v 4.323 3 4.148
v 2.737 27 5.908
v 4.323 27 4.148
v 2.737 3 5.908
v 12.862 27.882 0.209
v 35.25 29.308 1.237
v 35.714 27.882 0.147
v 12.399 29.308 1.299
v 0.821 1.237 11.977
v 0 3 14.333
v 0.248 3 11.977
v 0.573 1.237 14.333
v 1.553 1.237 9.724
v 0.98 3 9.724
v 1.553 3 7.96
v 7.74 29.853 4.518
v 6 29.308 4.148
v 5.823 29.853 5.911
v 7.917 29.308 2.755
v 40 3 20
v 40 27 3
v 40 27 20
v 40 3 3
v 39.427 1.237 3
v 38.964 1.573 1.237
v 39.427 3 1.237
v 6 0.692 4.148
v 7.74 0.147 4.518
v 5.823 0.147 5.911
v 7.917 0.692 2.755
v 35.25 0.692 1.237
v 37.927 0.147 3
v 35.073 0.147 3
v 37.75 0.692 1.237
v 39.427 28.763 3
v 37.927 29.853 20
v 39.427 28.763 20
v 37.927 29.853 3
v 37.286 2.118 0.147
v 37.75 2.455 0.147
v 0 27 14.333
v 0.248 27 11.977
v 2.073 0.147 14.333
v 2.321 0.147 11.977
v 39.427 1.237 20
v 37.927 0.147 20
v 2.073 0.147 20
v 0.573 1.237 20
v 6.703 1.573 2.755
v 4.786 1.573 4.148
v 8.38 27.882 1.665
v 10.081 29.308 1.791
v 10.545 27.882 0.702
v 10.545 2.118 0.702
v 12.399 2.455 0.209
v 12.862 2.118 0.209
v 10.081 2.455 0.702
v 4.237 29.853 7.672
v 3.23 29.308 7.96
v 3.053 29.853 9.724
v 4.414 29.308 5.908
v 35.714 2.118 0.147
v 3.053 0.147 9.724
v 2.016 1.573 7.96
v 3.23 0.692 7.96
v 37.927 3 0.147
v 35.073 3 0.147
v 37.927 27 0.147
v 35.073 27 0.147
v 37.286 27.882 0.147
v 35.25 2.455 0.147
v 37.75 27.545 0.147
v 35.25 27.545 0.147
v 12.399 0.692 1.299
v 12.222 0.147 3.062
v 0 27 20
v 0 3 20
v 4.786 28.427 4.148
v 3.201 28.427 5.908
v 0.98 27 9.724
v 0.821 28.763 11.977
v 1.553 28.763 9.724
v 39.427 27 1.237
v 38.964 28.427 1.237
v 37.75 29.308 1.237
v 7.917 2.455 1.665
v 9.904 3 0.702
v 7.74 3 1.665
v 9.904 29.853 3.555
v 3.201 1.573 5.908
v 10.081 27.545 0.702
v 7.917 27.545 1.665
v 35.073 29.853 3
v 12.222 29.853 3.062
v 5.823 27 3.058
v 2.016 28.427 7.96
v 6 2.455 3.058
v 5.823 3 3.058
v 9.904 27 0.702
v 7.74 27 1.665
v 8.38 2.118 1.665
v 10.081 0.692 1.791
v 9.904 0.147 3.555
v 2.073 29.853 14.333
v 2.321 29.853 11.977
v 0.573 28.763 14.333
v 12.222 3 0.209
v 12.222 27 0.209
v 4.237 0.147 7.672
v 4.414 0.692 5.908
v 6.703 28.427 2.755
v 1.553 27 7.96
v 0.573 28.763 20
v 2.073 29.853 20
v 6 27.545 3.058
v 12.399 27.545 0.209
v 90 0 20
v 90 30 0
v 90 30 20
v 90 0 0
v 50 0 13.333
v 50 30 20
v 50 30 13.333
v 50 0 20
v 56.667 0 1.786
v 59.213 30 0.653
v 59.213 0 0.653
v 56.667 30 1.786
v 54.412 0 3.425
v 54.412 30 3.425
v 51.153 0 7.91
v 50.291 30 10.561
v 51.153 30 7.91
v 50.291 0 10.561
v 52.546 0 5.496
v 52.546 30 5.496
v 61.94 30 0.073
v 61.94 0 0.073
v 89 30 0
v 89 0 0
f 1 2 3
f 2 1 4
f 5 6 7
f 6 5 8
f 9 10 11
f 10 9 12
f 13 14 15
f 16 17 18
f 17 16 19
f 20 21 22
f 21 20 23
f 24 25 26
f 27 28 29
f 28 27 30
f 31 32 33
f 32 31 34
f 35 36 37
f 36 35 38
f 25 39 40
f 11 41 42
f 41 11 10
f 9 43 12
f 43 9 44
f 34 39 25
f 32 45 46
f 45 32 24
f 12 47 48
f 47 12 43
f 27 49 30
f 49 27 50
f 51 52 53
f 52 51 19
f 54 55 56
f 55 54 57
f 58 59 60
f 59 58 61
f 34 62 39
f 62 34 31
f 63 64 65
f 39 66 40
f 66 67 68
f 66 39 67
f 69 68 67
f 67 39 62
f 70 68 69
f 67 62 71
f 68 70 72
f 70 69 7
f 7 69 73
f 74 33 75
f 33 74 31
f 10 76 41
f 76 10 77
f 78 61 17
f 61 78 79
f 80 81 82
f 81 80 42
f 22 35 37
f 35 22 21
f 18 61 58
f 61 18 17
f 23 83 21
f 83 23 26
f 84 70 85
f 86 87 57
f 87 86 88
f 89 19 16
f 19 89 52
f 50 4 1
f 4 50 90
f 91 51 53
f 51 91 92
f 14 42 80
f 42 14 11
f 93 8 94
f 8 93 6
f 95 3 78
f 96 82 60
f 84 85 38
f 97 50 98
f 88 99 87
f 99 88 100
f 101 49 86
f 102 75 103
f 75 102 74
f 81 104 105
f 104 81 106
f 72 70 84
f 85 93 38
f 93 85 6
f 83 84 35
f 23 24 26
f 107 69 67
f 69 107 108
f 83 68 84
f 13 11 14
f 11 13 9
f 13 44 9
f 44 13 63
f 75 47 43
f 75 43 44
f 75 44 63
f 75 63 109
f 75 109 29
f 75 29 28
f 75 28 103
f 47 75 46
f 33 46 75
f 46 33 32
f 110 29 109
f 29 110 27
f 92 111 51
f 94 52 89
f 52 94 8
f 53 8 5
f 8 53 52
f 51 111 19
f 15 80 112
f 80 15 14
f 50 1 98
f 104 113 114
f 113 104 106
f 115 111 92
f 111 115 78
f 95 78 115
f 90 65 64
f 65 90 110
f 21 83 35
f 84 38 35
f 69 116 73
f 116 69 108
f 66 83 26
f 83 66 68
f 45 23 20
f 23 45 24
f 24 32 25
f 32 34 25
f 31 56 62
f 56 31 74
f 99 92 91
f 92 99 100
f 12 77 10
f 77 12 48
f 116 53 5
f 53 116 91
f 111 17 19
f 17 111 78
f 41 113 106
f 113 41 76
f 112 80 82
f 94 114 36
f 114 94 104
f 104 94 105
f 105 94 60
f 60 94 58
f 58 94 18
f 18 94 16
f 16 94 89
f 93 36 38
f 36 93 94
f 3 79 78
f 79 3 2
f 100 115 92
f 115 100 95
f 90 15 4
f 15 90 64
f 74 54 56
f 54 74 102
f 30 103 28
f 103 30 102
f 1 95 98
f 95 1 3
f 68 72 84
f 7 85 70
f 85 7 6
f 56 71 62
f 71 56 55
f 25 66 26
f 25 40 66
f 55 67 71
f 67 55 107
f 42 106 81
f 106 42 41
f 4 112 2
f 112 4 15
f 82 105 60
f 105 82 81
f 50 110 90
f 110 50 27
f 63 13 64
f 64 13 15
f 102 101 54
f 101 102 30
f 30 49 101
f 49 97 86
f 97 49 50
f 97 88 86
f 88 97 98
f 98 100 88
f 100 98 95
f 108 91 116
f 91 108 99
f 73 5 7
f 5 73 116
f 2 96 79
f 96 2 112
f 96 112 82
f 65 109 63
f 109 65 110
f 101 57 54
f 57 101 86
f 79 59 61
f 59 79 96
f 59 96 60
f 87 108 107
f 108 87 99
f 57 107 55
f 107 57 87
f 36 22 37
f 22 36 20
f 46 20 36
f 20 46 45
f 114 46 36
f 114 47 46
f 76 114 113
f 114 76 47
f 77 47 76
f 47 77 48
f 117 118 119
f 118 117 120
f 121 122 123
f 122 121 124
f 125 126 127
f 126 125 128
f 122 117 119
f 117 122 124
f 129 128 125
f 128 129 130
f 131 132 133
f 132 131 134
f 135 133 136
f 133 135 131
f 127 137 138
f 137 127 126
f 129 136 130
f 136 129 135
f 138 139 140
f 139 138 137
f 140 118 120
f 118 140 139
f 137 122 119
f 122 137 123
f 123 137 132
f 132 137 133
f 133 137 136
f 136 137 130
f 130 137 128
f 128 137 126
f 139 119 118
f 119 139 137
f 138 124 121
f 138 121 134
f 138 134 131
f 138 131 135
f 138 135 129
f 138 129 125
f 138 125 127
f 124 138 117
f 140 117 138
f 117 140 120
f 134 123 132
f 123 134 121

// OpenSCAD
// file: ../rounded_square.scad
$bleed = 1;
$rounding = 3;

module rounded_square(size, flat_top=false, flat_bottom=false) {
  assert(!(flat_top && flat_bottom), "Flat top and flat bottom are exclusive");

  rounding_height = flat_top || flat_bottom 
    ? $rounding 
    : $rounding * 2;

  offset = flat_bottom ? 0 : $rounding;

  inner_size = [
    size[0] - $rounding * 2,
    size[1] - rounding_height,
  ];

  minkowski() {
    translate([$rounding, offset]) {
      square(inner_size);
    }
    if (flat_top ) {
      difference() {
        circle($rounding);
        translate([-$rounding, 0]) {
          square([$rounding * 2, $rounding]);
        }
      }
    } else if (flat_bottom) {
      difference() {
        circle($rounding);
        translate([-$rounding, -$rounding]) {
          square([$rounding * 2, $rounding]);
        }
      }
    } else {
      circle($rounding);
    }
  }
}
// file: ../rounded_cube.scad
include <./rounded_square.scad>

$bleed = 1;
$rounding = 3;

// Render a rounded cube
// flat_top: do not round the top edges
// flat_bottom: do not round the bottom edges
// flat: equals flat_top && flat_bottom
// 
// Limitations:
// requires height > $rounding * 2
// flat_top || flat_bottom requires height > $rounding
// flat_top && flat_bottom requires height > $bleed
module rounded_cube(
  size, 
  flat=false, 
  flat_top=false, 
  flat_bottom=false,
  side_rounding=-1
) {
  _flat = flat || (flat_top && flat_bottom);
  _flat_top = flat_top || flat;
  _flat_bottom = flat_bottom || flat;
  _rounding = min($rounding, size[2] / 2);
  _side_rounding = side_rounding > -1 ? side_rounding: $rounding;

  assert(_side_rounding >= $rounding, "side rounding cannot be less than rounding");

  top_height = _flat_top ? 0: _rounding;
  bottom_height = _flat_bottom ? 0: _rounding;

  cube_size = [
    size[0] - _rounding * 2,
    size[1] - _rounding * 2,
    size[2] - (top_height + bottom_height)
  ];

  if (_flat_top && _flat_bottom) {
     linear_extrude(cube_size[2]) {
       rounded_square([size[0], size[1]]);
     }
   } else {
     minkowski() {
       translate([_rounding, _rounding, bottom_height]) {
         if (_side_rounding != _rounding) {
           linear_extrude(cube_size[2]) {
             rounded_square([cube_size[0], cube_size[1]], $rounding=_side_rounding);
           }
         } else {
           cube(cube_size);
         }
       }

       if (_flat_top) {
         difference() {
           sphere(_rounding);
           cylinder(_rounding, _rounding, _rounding);
         }
       } else if (_flat_bottom) {
         difference() {
           sphere(_rounding);
           translate ([0, 0, -_rounding]) {
             cylinder(_rounding, _rounding, _rounding);
           }
         }
       } else {
         sphere(_rounding);
       }
    }
  }
}
// file: ../scoop.scad
include <./rounded_cube.scad>

$bleed = 1;
$rounding = 3;
$wall_thickness = 2;

module cylinder_quarter(height, radius) {
  cube_size = (radius + $bleed) * 2;
  cube_height = height + $bleed * 2;
  half_cube_size = cube_size / 2;

  difference() {
    cylinder(height, r=radius);

    translate([0, -half_cube_size, -$bleed]) {
      cube([cube_size, cube_size, cube_height]);
    }
    translate([-half_cube_size, -cube_size, -$bleed]) {
      cube([cube_size, cube_size, cube_height]);
    }
  }
}

module _unrounded_scoop(size, radius) {
  width = size[0];
  length = size[1];
  height = size[2];

  min_radius = min(
    radius ? radius : height,
  height,
    width / 3
  );
  hull() {
    translate([width -1, 0, 0]) {
      cube([1, length, height]);
    }
    translate([0, 0, height - 1]) {
      cube([width, length, 1]);
    }
    translate([min_radius, 0, min_radius]) rotate([-90, 0, 0]) {
      cylinder_quarter(length, min_radius);
    }
  }
}

module scoop(size, radius = 0, rounded=true) {
  min_radius = min(
    radius ? radius : size[2],
    size[2],
    size[0] / 3
  );

  unrounded_size = [
    size[0] - $rounding * 2,
    size[1] - $rounding * 2,
    size[2] - $rounding,
  ];

  if (rounded) {
    difference() {
      translate([$rounding, $rounding, $rounding]) {
        minkowski() {
          _unrounded_scoop(unrounded_size, radius);

          // round with a sphere
          sphere($rounding);
        }
      }

      // slice off the top
      translate([-$bleed, -$bleed, size[2]]) {
        cube([
          size[0] + $bleed * 2,
          size[1] + $bleed * 2,
          $rounding +  $bleed * 2
        ]);
      }
    }
  } else {
    _unrounded_scoop(size, radius);
  }
}
// main file
include <../../lib/scoop.scad>

dimensions = [40, 30, 20];

scoop(dimensions);

translate([dimensions[0] + 10, 0, 0]) {
  scoop(dimensions, rounded=false);
}
